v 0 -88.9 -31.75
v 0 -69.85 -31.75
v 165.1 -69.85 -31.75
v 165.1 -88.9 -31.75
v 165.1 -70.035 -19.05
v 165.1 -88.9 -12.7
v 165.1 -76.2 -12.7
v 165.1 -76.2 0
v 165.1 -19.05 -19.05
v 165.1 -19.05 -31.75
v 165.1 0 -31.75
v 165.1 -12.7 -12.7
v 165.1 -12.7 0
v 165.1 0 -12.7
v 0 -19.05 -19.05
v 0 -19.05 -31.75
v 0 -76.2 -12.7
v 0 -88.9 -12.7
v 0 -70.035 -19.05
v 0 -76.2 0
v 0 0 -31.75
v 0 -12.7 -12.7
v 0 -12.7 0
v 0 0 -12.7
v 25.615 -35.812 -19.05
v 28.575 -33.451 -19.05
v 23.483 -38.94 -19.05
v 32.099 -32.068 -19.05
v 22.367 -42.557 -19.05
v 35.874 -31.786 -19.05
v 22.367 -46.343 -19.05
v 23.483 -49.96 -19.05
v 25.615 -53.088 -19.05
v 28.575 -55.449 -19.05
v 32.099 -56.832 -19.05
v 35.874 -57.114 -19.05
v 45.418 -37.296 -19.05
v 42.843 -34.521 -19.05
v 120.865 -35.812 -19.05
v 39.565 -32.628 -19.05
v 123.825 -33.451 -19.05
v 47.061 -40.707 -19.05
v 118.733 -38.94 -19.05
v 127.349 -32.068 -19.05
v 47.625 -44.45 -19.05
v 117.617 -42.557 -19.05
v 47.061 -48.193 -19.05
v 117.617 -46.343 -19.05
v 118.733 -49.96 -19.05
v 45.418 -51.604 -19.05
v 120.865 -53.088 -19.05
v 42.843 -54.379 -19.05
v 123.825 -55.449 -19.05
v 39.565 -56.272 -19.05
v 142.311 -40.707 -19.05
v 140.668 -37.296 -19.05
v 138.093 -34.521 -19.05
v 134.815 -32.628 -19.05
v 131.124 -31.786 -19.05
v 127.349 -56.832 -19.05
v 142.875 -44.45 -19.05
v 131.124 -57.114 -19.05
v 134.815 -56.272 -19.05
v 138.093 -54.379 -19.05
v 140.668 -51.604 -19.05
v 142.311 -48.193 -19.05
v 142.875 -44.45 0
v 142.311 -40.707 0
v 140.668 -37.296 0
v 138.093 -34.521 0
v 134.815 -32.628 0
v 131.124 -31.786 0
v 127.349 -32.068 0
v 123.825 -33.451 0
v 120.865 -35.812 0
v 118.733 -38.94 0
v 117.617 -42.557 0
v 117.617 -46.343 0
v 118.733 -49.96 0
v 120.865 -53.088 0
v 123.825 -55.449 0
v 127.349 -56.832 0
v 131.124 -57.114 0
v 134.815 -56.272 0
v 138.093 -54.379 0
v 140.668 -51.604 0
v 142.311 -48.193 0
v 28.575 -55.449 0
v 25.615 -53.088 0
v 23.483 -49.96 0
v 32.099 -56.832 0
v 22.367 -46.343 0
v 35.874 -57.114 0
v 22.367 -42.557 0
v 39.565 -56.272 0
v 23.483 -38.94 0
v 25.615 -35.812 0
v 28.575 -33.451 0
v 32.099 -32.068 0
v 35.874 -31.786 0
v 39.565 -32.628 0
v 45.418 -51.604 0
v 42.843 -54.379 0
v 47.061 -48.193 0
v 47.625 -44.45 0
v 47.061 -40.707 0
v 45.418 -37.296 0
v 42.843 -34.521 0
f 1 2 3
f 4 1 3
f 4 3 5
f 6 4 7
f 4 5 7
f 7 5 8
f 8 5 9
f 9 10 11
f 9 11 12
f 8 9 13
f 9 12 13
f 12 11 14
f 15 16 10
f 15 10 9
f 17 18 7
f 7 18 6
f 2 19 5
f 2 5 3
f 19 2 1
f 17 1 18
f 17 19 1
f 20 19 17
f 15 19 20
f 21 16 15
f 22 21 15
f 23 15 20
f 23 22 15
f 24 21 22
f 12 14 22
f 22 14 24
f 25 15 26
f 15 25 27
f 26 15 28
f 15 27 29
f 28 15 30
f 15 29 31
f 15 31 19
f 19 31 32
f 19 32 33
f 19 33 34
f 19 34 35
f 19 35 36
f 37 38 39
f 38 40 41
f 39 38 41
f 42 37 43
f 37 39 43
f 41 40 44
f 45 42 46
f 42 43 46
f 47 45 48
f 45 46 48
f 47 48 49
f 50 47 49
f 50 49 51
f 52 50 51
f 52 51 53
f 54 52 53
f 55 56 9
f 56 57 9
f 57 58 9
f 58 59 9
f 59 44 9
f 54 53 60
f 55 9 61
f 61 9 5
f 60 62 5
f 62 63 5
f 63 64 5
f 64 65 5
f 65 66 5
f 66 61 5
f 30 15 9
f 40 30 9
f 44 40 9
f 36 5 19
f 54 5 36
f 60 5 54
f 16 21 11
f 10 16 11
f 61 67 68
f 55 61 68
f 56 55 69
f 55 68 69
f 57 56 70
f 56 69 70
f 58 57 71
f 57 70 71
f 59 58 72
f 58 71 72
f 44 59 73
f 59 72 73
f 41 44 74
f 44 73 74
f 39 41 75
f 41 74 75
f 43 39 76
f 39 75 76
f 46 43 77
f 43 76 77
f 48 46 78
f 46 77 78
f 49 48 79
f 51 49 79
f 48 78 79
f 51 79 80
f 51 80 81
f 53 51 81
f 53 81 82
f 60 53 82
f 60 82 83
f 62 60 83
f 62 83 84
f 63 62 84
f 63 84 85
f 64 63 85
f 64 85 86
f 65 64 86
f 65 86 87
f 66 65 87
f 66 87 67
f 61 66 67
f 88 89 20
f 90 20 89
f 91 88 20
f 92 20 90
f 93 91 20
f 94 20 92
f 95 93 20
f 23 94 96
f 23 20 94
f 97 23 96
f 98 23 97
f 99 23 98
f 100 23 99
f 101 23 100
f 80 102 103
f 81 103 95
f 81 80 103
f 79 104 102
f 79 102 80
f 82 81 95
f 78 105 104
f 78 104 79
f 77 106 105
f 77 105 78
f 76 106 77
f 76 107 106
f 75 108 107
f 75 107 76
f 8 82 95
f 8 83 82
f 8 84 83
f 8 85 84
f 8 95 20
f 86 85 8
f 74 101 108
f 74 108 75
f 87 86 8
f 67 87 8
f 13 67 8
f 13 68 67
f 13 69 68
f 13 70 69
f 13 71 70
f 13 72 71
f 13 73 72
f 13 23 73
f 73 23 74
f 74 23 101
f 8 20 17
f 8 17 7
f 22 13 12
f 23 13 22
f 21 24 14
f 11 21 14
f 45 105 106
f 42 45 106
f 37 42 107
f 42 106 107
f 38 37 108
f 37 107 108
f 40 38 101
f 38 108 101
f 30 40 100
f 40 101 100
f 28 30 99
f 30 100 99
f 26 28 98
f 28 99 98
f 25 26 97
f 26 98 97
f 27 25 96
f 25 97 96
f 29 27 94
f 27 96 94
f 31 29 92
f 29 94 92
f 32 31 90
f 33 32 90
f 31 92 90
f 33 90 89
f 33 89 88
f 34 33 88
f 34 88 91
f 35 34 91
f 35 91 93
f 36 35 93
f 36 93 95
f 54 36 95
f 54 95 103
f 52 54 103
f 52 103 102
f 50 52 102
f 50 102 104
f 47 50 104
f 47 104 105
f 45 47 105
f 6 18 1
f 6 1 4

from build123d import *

# Parameters (mm, degrees)
F0_W     = 165.1
F0_H     = 31.75
F1_DEPTH = 88.9
F3_DEPTH = 165.101
F4_W     = 165.1
F4_H     = 12.7
F5_DEPTH = 12.7
F6_W     = 165.1
F6_H     = 12.7
F7_DEPTH = 12.7
F8_R     = 12.7
F9_DEPTH = 31.751


with BuildPart() as f1:
    # F0 (on Front) → F1 (new body)
    with BuildSketch(Plane.XZ):
        with Locations((82.55, -15.875)):
            Rectangle(F0_W, F0_H)
    extrude(amount=F1_DEPTH)

    # F2 (on face) → F3 (cut, through all)
    with BuildSketch(Plane.YZ.offset(165.1)):
        Polygon((-70.034593, -19.05), (-69.85, -31.75), (-19.05, -31.75), (-19.05, -19.05), align=None)
    extrude(amount=-F3_DEPTH, mode=Mode.SUBTRACT)

    # F4 (on face) → F5 (cut)
    with BuildSketch(Plane.XZ.offset(88.9)):
        with Locations((82.55, -6.35)):
            Rectangle(F4_W, F4_H)
    extrude(amount=-F5_DEPTH, mode=Mode.SUBTRACT)

    # F6 (on face) → F7 (cut)
    with BuildSketch(Plane(origin=(0, 0, 0), x_dir=(-1, 0, 0), z_dir=(0, 1, 0))):
        with Locations((-82.55, -6.35)):
            Rectangle(F6_W, F6_H)
    extrude(amount=-F7_DEPTH, mode=Mode.SUBTRACT)

    # F8 (on face) → F9 (cut, through all)
    with BuildSketch(Plane.XY):
        with Locations((34.925, -44.45)):
            Circle(F8_R)
        with Locations((130.175, -44.45)):
            Circle(F8_R)
    extrude(amount=-F9_DEPTH, mode=Mode.SUBTRACT)


solid = f1.part
